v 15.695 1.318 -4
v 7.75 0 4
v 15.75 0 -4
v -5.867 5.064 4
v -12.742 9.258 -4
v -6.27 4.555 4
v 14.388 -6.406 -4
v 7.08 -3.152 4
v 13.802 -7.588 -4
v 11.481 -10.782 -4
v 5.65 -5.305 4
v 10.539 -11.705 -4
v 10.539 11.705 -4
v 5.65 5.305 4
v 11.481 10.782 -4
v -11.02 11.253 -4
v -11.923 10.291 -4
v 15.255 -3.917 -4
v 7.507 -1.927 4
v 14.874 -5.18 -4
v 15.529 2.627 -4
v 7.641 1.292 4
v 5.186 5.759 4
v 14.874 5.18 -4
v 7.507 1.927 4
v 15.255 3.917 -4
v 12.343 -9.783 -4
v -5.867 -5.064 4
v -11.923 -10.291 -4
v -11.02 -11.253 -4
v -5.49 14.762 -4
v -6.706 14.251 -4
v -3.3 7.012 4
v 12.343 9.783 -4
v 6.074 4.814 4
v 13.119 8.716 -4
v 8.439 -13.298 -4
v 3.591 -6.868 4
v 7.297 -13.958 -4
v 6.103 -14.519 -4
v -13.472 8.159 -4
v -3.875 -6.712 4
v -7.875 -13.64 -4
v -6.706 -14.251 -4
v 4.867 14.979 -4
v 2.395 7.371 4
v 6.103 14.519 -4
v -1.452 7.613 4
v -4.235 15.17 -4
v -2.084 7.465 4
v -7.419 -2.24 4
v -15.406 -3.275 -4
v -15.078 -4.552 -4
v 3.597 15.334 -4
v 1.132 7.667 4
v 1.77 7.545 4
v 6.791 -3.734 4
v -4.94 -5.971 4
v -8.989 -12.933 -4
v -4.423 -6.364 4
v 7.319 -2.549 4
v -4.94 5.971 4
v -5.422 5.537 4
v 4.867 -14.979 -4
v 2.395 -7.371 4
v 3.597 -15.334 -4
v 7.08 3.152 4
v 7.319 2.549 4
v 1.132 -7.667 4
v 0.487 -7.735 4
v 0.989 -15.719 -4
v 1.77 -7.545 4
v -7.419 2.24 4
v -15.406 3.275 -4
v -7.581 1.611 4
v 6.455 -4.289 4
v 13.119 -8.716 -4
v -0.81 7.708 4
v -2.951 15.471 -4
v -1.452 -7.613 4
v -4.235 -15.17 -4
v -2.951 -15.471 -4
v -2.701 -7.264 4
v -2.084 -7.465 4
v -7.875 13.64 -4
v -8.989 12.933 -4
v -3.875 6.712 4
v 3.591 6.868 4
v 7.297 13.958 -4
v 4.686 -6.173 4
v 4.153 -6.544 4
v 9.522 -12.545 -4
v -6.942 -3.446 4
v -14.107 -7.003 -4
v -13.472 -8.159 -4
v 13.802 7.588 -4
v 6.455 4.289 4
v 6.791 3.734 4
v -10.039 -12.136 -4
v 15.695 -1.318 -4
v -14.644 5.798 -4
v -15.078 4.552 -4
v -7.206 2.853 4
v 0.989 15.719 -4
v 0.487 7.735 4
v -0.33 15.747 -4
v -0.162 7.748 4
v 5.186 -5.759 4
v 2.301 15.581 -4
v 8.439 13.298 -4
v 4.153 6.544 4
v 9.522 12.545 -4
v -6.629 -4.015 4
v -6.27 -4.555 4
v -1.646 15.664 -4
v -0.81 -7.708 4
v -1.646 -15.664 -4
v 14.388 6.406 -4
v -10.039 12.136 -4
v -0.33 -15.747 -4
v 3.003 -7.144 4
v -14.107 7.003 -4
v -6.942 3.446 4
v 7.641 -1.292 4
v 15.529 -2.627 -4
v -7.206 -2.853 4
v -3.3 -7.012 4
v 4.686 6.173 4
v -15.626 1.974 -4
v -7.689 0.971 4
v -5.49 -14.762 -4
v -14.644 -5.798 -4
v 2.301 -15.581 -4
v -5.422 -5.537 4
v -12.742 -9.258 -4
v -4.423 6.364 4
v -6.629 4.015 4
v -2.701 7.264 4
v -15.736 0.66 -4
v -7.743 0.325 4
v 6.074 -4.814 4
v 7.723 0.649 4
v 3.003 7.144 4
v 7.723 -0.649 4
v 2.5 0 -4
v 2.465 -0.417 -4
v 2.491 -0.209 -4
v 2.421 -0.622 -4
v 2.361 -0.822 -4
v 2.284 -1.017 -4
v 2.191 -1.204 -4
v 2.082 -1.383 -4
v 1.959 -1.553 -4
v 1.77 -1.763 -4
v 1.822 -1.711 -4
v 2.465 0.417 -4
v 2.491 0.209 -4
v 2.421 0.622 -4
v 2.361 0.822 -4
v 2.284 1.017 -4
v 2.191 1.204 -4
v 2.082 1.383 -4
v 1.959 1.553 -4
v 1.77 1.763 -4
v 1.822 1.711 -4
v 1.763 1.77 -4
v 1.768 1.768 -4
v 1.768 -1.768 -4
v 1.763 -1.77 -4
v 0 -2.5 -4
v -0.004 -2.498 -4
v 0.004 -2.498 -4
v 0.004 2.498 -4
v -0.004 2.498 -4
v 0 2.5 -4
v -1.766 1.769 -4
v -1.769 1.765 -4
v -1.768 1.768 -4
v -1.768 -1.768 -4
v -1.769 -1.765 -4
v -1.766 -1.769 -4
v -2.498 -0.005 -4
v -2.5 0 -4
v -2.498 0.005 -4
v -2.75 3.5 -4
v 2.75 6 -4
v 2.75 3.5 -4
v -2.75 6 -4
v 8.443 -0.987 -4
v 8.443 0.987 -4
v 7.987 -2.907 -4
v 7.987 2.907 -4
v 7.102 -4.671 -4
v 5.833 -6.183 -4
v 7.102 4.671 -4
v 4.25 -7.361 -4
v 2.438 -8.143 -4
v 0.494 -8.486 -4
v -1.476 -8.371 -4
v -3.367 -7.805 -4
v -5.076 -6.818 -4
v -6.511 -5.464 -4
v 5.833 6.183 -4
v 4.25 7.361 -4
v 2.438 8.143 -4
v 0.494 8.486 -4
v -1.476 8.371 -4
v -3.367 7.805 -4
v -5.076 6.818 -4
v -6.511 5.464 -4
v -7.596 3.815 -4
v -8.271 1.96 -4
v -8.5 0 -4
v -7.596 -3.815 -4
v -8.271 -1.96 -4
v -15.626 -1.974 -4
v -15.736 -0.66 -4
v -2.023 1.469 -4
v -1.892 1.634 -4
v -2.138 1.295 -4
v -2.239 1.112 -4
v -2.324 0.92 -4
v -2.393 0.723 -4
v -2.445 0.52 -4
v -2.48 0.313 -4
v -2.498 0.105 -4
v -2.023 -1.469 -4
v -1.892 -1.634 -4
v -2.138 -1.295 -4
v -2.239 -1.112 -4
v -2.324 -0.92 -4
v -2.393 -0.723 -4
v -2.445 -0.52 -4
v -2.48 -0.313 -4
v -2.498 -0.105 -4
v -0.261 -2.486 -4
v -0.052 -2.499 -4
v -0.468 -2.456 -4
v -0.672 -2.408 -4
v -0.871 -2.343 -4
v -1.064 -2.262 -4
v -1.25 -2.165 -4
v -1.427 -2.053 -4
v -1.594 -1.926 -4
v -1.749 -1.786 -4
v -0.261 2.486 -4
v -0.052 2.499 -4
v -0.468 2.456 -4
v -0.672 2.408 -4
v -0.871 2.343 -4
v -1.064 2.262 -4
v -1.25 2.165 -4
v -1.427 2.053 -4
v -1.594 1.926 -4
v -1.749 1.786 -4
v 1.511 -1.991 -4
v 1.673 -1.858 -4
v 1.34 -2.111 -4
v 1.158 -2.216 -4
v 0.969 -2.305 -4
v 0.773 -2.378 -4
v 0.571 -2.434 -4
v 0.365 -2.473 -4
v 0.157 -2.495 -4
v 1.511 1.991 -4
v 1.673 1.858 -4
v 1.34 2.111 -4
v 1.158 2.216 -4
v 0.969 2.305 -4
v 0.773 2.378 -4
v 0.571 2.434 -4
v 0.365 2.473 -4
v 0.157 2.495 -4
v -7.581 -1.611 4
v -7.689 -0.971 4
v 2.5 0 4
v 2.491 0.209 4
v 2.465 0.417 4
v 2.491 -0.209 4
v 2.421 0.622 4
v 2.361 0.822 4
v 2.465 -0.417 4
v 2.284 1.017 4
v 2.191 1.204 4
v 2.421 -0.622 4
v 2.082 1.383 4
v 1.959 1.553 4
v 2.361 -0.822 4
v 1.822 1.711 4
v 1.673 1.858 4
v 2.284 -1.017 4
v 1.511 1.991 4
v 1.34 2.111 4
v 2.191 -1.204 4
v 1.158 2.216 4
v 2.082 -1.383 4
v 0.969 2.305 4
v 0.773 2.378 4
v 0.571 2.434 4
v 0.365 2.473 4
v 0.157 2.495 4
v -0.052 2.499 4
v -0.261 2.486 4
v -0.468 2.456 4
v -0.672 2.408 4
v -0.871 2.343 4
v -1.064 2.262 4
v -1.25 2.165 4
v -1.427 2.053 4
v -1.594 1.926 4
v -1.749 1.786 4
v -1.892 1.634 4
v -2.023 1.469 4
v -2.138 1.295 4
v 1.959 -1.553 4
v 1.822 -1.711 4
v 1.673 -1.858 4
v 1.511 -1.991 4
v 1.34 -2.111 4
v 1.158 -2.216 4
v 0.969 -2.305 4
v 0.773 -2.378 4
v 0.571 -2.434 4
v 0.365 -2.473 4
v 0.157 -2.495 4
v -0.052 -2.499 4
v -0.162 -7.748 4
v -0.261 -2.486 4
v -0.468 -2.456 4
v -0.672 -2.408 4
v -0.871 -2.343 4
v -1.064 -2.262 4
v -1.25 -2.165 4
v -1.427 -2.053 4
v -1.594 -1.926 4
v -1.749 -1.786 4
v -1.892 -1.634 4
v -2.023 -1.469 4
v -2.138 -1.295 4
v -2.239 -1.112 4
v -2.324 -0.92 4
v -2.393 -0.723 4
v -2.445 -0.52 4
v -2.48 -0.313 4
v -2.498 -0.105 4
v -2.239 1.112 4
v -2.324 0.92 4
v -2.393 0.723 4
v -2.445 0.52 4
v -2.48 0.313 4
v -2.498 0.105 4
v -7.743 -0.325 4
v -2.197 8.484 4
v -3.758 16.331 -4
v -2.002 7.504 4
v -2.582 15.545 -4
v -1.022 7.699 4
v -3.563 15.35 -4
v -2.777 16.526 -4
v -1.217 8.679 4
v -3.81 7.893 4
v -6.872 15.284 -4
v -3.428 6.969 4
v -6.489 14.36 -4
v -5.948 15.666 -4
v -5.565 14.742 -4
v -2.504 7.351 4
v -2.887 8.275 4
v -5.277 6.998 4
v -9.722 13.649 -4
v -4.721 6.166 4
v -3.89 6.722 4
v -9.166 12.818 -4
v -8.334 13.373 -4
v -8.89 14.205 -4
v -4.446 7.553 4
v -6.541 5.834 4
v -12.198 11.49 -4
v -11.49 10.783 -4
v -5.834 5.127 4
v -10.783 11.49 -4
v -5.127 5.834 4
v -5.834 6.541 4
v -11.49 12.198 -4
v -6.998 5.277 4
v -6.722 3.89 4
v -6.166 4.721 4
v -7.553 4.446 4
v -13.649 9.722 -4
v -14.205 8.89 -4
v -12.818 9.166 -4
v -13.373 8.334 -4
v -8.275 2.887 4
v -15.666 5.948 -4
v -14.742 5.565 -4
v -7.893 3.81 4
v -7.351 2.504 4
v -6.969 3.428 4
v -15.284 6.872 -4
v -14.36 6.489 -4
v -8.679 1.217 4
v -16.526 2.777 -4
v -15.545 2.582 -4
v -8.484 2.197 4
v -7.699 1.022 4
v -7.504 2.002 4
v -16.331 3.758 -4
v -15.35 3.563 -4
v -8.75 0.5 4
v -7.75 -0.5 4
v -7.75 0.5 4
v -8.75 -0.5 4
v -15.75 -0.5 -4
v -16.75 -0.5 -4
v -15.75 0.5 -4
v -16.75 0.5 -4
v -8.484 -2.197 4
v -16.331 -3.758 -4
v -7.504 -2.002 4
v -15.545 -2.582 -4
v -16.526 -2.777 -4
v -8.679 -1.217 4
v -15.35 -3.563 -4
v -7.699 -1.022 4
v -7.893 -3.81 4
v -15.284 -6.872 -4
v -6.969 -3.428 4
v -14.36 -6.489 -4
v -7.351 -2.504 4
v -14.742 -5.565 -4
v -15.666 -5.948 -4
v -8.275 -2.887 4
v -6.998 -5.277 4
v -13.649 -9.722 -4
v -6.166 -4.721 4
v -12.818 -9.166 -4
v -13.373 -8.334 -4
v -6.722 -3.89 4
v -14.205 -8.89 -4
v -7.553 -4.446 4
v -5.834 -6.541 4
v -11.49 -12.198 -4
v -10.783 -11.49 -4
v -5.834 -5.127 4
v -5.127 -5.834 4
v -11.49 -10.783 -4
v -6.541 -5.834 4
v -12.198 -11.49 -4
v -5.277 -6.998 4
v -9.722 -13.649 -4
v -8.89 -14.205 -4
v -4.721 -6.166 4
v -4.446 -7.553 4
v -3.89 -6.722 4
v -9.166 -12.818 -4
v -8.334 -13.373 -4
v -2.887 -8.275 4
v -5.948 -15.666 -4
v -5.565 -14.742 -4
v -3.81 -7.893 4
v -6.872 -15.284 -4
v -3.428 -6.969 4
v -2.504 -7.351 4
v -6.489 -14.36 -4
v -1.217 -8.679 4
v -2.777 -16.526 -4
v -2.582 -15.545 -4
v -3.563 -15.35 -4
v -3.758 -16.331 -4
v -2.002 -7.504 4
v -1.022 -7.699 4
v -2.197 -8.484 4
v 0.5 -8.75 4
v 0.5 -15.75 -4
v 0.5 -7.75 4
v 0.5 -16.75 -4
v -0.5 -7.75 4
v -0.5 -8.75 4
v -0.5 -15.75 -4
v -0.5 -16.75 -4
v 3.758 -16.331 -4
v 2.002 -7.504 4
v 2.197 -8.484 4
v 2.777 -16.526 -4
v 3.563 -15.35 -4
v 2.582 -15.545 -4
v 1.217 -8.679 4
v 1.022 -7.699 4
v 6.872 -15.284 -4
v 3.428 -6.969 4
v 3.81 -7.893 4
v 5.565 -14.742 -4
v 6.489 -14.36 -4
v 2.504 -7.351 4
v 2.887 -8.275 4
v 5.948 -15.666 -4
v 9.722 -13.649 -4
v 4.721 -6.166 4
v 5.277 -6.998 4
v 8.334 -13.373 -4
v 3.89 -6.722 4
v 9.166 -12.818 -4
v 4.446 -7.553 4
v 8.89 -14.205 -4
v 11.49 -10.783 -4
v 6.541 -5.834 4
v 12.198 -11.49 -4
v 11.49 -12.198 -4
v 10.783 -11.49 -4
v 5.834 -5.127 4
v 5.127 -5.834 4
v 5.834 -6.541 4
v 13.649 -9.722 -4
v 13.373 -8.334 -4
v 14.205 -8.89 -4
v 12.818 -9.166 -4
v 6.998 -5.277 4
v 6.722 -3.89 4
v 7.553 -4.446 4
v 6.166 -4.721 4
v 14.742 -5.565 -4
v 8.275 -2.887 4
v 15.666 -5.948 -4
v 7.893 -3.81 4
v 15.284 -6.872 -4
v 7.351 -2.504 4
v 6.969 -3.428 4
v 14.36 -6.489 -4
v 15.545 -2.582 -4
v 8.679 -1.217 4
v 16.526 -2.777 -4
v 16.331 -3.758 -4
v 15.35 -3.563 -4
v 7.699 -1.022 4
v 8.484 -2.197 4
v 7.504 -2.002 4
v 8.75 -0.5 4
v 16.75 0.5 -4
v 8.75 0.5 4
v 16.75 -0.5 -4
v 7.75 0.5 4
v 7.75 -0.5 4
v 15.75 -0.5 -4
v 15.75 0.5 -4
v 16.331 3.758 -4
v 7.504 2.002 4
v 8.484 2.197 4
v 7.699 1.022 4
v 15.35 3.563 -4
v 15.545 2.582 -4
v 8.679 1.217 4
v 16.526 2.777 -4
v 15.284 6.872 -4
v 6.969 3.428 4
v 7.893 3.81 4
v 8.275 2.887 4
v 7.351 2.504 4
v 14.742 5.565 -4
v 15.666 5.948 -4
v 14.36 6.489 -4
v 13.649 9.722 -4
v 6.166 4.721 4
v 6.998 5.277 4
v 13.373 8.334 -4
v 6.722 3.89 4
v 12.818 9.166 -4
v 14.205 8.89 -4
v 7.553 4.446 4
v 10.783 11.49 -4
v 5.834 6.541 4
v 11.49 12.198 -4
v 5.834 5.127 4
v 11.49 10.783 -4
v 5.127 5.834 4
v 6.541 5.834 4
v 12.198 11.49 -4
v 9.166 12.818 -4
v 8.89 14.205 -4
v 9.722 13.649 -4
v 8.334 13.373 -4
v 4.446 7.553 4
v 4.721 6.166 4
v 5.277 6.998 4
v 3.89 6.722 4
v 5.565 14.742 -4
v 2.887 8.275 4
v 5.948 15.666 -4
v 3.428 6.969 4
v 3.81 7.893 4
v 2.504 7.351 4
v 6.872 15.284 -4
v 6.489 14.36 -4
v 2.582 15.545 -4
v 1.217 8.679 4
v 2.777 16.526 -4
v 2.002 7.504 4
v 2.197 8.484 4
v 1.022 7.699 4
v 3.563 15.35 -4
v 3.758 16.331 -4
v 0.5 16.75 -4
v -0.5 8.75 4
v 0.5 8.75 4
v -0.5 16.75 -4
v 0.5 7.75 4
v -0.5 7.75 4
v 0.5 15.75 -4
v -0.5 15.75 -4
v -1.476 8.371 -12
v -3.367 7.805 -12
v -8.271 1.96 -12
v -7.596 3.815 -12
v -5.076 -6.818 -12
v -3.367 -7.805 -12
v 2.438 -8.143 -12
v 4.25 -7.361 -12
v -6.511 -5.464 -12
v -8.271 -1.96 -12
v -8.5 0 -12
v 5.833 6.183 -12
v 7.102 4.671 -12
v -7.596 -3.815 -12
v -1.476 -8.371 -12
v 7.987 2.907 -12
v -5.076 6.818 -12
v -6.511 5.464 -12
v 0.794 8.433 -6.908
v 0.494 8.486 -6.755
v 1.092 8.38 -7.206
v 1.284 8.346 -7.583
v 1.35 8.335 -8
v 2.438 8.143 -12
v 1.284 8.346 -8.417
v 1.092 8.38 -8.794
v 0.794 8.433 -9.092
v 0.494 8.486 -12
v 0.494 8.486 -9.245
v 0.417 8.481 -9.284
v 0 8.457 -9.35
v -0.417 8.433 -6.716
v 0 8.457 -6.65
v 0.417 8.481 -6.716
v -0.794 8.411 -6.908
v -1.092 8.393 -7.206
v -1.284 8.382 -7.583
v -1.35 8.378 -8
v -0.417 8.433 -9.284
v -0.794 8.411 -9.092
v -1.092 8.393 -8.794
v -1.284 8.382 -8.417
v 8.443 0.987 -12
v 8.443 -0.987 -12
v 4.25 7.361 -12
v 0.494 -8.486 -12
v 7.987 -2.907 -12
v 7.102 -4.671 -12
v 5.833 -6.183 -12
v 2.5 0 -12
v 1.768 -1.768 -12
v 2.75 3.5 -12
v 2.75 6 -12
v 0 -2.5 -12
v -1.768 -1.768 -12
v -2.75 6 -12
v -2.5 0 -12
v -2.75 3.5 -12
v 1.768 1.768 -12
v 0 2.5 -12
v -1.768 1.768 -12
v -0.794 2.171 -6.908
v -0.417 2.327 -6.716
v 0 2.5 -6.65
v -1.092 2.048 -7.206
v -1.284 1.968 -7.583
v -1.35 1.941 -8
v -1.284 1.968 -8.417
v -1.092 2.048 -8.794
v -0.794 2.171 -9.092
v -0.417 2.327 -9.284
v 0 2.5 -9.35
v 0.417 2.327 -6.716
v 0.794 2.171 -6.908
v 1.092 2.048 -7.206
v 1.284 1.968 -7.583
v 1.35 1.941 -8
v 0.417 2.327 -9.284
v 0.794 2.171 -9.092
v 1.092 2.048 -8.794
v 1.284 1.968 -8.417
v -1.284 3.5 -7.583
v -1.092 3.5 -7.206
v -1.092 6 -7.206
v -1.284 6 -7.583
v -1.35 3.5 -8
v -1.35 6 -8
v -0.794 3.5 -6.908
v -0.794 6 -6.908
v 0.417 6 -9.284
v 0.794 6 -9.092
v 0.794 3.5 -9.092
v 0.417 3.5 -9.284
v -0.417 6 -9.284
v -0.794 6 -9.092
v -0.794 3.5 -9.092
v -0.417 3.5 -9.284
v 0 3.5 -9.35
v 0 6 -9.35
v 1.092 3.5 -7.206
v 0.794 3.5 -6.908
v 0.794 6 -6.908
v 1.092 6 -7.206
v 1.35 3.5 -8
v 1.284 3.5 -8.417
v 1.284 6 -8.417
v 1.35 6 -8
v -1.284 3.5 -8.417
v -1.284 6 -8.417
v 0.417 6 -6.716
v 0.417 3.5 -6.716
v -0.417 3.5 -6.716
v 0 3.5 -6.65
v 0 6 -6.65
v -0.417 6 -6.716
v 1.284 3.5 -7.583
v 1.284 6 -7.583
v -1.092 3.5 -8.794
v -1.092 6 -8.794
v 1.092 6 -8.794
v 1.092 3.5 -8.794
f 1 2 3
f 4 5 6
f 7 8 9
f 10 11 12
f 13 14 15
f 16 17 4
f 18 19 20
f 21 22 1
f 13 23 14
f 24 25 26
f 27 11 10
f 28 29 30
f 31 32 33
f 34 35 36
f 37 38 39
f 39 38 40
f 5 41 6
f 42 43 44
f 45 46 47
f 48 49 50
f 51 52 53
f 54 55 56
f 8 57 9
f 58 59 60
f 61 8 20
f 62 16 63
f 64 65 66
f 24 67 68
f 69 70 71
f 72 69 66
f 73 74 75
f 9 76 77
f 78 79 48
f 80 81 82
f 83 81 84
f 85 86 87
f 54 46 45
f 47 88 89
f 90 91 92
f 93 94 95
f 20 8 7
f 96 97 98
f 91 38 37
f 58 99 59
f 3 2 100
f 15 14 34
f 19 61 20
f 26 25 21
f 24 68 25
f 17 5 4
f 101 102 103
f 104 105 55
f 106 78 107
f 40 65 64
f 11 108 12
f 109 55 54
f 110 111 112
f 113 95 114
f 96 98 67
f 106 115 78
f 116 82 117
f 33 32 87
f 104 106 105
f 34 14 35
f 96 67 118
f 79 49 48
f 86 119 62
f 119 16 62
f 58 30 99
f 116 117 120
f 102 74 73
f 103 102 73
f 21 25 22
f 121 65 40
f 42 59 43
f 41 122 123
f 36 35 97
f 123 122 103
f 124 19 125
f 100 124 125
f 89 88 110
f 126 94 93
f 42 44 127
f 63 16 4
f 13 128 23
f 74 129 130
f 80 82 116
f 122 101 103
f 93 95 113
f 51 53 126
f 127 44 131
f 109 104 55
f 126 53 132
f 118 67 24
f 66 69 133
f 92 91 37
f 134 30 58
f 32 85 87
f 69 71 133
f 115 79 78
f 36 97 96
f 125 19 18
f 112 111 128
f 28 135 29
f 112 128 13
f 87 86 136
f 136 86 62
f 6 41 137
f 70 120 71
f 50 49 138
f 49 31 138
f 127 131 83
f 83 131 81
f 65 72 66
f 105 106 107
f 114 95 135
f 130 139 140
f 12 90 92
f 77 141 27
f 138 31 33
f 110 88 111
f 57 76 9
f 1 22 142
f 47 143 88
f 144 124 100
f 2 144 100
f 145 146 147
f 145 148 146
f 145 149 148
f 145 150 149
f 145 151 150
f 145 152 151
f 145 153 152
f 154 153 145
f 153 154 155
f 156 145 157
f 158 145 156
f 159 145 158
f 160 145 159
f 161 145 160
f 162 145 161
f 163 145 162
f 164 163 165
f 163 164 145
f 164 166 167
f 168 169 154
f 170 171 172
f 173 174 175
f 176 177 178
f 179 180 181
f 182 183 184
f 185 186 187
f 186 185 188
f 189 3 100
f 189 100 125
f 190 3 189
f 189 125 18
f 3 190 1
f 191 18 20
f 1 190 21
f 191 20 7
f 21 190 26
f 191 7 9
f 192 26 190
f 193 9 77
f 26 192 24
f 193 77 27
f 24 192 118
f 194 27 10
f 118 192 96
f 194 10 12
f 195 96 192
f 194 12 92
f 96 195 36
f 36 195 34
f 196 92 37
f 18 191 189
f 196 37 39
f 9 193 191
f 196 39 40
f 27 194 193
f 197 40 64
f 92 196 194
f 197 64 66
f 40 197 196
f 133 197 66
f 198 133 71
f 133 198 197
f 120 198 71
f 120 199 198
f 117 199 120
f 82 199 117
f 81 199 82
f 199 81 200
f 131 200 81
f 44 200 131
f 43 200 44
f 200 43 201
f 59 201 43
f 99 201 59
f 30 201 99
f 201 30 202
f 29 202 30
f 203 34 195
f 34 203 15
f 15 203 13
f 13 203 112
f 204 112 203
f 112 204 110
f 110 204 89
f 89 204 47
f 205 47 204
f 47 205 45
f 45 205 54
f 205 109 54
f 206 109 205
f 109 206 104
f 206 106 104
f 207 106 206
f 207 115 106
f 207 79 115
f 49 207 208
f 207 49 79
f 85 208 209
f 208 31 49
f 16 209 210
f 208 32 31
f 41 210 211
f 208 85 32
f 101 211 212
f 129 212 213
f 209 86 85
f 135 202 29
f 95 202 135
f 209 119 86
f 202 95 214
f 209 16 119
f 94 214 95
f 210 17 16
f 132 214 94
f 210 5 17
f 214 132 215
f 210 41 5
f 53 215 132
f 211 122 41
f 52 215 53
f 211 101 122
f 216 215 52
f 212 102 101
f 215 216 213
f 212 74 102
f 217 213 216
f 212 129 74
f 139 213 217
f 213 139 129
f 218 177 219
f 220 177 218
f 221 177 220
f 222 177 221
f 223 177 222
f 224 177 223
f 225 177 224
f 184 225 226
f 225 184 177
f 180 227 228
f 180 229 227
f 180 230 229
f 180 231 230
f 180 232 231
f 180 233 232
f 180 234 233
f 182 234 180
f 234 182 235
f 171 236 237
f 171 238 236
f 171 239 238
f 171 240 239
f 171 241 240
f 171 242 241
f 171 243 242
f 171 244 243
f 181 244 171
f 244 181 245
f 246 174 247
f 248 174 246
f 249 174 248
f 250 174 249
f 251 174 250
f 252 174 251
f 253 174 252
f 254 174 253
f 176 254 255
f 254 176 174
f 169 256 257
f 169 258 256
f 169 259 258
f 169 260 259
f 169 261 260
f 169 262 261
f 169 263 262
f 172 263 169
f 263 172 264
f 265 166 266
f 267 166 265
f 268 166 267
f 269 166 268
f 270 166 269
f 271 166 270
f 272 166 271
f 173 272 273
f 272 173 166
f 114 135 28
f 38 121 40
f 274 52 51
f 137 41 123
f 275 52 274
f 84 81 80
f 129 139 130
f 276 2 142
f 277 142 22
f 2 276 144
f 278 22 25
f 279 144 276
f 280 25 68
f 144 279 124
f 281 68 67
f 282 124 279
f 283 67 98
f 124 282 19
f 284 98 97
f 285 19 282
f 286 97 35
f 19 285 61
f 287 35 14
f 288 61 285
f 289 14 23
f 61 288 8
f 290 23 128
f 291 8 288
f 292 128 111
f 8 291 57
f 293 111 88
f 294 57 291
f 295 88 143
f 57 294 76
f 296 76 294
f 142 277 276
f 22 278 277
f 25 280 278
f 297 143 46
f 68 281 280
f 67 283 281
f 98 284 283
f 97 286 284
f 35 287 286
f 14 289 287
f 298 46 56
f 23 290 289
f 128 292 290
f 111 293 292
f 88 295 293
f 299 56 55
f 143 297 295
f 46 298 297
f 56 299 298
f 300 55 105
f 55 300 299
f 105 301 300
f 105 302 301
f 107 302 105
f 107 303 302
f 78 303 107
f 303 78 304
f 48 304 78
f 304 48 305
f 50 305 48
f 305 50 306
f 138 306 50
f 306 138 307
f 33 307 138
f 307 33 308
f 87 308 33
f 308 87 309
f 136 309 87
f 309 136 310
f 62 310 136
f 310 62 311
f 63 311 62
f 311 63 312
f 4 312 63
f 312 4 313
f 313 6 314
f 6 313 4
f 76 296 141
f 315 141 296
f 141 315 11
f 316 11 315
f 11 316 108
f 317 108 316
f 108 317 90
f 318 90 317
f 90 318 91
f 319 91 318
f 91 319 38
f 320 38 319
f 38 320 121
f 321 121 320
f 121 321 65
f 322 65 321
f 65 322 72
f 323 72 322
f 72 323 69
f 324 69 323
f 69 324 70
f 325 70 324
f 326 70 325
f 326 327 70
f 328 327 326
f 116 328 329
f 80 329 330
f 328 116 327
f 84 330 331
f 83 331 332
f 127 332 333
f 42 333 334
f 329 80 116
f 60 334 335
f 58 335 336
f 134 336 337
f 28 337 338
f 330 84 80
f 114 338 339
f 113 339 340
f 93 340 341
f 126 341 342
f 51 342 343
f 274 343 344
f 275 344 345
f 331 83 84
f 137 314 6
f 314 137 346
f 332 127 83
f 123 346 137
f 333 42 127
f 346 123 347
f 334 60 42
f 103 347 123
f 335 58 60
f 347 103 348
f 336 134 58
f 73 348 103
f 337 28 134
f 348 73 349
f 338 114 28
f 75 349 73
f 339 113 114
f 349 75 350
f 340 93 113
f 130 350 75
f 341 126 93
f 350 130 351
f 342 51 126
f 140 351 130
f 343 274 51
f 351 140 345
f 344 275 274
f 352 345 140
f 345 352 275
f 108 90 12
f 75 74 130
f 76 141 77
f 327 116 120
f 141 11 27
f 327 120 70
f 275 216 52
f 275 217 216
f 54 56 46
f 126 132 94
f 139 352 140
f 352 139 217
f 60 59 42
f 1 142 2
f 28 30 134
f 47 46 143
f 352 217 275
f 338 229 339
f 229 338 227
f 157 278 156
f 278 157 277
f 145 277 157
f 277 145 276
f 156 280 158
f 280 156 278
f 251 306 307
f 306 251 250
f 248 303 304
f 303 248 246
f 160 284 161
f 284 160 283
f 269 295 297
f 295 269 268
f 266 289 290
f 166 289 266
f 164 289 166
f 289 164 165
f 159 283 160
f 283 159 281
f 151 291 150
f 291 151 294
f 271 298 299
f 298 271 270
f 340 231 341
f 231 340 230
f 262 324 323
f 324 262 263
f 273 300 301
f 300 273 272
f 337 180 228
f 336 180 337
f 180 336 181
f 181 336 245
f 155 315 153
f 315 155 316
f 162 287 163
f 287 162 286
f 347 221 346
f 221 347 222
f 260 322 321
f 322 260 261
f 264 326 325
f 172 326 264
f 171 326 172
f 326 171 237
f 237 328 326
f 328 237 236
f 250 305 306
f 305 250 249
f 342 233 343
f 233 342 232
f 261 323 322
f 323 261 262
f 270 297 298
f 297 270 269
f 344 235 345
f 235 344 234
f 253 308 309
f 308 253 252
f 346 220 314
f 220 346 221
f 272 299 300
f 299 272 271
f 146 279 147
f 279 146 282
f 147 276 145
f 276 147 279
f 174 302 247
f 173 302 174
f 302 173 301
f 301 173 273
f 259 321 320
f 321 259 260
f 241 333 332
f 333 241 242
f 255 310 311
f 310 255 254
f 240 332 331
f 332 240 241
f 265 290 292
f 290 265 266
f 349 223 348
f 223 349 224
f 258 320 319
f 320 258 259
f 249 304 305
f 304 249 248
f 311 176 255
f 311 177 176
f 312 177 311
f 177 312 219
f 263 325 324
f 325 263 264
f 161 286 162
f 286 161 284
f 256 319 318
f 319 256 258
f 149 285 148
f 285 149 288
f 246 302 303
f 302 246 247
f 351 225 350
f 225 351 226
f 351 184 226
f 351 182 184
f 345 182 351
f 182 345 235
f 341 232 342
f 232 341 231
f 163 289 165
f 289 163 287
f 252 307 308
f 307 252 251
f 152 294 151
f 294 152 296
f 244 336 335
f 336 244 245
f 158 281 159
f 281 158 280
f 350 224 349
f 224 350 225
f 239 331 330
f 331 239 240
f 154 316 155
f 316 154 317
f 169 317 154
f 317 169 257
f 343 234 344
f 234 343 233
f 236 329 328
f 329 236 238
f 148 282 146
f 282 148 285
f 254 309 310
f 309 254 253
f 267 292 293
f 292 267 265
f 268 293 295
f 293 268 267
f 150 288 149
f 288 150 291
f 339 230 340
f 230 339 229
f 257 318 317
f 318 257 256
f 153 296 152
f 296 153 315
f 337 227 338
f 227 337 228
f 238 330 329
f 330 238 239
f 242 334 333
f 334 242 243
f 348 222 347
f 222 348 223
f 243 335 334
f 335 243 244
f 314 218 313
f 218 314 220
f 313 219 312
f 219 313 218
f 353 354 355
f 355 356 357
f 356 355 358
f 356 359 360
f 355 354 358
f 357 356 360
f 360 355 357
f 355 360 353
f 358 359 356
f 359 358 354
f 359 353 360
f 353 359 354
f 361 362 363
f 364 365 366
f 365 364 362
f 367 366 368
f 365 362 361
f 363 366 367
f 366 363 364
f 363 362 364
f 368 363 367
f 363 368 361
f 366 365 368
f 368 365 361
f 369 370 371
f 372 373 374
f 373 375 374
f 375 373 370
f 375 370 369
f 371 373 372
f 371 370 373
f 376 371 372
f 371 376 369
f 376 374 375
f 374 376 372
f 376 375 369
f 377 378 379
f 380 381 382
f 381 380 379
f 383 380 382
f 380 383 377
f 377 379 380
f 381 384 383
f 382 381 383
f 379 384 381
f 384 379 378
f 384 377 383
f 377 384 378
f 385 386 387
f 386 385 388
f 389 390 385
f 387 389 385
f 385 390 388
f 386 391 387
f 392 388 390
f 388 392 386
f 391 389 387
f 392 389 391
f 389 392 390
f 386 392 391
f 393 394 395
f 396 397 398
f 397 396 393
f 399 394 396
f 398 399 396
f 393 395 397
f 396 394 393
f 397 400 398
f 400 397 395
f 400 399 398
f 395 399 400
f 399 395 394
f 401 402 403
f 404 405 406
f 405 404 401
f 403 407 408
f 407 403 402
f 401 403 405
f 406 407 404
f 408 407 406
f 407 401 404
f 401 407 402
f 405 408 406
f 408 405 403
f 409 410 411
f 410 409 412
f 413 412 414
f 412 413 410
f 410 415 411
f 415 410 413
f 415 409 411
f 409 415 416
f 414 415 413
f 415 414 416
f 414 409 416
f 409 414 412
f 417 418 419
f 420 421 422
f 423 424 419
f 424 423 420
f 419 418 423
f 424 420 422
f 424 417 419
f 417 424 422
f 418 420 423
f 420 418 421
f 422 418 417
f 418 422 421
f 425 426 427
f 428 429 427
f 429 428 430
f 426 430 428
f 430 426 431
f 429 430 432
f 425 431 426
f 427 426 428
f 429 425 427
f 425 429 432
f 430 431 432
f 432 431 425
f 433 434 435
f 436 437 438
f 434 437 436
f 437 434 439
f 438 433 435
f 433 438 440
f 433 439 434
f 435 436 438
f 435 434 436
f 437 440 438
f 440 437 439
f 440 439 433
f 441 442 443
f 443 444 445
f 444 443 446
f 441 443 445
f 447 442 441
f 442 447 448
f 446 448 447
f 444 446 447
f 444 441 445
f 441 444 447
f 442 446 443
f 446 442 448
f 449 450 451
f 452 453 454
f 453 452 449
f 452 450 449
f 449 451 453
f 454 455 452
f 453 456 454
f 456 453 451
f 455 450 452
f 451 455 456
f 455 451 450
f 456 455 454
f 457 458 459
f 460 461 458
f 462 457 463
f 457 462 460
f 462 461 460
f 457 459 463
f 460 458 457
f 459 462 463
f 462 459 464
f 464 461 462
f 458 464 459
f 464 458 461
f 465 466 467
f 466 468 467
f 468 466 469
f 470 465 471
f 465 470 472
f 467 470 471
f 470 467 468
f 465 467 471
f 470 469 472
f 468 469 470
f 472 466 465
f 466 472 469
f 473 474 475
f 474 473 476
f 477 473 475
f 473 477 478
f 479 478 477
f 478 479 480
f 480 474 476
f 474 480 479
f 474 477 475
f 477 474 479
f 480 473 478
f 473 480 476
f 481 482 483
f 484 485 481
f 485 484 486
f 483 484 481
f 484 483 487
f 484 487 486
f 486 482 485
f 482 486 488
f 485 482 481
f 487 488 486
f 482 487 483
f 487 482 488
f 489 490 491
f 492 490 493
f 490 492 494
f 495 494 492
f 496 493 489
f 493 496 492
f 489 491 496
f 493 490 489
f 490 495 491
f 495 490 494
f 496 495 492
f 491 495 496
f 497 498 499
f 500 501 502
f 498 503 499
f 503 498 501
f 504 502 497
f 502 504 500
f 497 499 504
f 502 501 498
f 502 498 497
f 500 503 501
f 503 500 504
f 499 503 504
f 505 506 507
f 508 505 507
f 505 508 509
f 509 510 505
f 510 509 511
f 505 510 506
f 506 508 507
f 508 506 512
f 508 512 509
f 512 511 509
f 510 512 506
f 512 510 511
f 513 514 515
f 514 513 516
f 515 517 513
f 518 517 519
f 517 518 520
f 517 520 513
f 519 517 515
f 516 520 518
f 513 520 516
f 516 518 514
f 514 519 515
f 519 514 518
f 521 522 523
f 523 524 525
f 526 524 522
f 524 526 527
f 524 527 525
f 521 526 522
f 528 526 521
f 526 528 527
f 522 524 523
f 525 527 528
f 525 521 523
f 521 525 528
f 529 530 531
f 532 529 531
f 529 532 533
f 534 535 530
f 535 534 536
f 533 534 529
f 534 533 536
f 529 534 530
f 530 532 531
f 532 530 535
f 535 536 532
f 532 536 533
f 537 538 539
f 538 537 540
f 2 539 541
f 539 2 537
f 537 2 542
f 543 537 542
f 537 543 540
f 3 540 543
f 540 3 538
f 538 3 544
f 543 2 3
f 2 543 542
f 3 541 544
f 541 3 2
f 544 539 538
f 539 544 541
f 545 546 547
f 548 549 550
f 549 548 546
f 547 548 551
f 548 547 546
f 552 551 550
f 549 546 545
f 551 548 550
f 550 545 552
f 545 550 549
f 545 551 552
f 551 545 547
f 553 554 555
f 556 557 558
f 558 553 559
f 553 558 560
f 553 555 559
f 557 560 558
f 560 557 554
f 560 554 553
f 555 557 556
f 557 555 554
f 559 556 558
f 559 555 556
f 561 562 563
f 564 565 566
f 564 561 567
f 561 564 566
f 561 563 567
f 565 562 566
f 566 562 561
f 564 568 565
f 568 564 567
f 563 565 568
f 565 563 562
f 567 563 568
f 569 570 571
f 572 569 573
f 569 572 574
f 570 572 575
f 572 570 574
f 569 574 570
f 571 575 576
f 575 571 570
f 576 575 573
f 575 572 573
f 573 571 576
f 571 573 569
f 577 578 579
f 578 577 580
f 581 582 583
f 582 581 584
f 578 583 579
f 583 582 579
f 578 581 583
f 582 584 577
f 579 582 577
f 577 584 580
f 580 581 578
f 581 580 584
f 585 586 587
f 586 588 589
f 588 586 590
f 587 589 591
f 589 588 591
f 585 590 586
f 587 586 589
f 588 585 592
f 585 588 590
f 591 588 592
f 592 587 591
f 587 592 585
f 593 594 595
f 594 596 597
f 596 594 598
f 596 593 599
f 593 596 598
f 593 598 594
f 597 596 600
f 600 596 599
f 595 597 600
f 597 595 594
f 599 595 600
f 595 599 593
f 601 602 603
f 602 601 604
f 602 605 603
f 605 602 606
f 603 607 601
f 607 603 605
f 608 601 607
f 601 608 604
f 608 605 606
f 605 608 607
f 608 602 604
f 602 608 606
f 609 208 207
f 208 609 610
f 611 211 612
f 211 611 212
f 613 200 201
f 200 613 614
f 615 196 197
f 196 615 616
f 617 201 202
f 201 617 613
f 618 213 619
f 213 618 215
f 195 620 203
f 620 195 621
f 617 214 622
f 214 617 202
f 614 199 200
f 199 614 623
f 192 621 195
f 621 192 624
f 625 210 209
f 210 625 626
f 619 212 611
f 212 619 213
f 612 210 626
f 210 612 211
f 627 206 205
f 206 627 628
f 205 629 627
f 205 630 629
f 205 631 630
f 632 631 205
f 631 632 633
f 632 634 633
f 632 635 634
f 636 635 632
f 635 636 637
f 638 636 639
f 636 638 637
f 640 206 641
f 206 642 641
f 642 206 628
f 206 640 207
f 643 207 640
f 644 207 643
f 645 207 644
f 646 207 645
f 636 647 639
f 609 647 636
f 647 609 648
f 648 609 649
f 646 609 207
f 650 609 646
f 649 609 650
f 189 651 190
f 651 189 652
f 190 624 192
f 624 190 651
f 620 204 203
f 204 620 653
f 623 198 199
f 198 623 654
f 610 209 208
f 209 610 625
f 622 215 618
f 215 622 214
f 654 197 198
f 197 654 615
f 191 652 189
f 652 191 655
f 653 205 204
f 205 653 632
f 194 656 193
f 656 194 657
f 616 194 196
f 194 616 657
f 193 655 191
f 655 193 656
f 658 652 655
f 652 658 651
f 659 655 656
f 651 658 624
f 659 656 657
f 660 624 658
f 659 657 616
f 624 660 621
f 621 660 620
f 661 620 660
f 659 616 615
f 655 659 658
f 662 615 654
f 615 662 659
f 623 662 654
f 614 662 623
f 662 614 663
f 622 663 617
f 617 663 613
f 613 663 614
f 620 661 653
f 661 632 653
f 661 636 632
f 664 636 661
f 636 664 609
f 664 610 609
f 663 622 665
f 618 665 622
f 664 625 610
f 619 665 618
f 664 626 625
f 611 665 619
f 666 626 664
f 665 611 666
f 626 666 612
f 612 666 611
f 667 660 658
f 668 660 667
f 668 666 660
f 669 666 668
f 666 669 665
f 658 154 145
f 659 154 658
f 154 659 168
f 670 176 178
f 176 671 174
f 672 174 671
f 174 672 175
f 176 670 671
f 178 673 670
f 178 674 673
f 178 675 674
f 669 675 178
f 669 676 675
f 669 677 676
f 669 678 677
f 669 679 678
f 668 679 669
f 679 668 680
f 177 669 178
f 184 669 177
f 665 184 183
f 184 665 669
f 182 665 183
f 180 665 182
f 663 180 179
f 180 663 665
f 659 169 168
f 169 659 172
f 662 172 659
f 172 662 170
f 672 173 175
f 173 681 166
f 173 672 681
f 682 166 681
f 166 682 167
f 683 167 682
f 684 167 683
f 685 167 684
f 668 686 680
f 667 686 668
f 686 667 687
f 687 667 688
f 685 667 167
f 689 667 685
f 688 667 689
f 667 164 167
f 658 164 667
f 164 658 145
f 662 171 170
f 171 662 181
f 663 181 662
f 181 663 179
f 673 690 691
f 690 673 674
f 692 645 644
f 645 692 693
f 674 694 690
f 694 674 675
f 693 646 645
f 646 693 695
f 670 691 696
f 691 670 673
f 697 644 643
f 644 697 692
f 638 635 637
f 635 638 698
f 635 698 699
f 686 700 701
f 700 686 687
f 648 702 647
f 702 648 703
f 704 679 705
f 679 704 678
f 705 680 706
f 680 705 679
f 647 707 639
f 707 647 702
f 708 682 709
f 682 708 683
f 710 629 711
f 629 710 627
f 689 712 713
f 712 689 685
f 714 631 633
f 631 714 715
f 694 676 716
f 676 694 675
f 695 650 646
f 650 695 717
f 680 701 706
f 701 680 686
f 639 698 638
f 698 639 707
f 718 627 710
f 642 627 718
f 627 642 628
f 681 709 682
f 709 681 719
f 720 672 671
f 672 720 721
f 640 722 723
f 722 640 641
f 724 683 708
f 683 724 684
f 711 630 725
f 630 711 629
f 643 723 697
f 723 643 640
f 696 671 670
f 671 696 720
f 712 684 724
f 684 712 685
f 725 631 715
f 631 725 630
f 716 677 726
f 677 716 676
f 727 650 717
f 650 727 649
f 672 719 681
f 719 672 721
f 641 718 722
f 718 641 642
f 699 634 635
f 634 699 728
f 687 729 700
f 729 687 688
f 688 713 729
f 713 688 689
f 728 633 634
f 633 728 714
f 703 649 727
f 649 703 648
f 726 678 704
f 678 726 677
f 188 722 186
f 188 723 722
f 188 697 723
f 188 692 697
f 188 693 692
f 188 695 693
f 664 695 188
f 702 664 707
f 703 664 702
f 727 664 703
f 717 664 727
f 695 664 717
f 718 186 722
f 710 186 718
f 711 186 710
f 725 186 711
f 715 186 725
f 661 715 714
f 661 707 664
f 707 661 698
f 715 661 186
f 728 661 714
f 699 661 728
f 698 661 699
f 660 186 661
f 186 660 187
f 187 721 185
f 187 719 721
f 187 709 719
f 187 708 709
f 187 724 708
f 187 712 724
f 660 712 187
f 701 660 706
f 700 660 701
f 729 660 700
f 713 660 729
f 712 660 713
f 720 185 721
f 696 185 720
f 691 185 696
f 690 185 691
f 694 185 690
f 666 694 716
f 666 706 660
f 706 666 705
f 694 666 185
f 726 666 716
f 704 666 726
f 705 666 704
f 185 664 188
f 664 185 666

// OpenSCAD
// Parametric Gears
// by wayland
// http://www.thingiverse.com/thing:2085

// General Parameters

basediameter = 32;   // pitch diameter of widest part 
depth = 8;           // depth of the gear
holediam = 5;        // diameter of center hole
teethnumber = 32;    // number of teeth
toothwidth = 1;      // width of teeth
addendum = 1/2;      // addendum
dedendum = 1/2;      // dedendum
toothshape = 0;   // how much of the tooth is triangular			                // for no triangles, make it 0
				 // otherwise it should be a fraction
centercircles = 0;   // number of center circles
				 // if you don't want any, put 0
				 // they are radially centered
centercircdiam = 3;  // diameter of center circles


//Bevel Parameters

degrees = 45;        // base angle of the gear
				 // 90 for a regular spur gear
				 // negative numbers are possible
extendbevel = 0;     // creates a spur top for bevel gears 
				 // only works if rbasediameter = 0
				 // 1 is on, 0 is off
bdepth = 3;          // thickness of extended bevel 
basedepth = 2;       // depth of the flat base at the bottom
				 // to turn it off, just make it 0

//Rome Gear Parameters:

rbasediameter = 0;   // pitch diameter of widest part
				 // to turn Rome gear off, make it 0
rdegrees = 90;       // base angle
rdepth = 2;          // thickness
rteeth = 10;         // number of teeth
rtwidth = 1;         // tooth width
raddendum = 1/4;     // addendum
rdedendum = 1/4;     // dedendum
rtoothshape = 1;

//Mounting:

mountingwall = 2;
nuthole = 5.5;
nutholedepth = 2.5;

/*---------------------------------------------------------*/

// Modules

module gear (diam1, thick, angle, ded, add, twidth, tnumber, toothfraction)
 {

	//Trig to find top diameter:

	triangbase = thick / tan(angle);
	topdiameter =  (diam1 - 2 * triangbase) - ded;

	//Miscellaneous variables:

	bottomdiameter = diam1 - ded;
	howmuchistri = toothfraction * (add + ded);
	toothlength = (add + ded) - howmuchistri; 
	xthick = twidth/2;

	union() {

		difference () {

			cylinder(h = thick, r1 = bottomdiameter/2, r2 = topdiameter/2, $fn = 75, center = true);
			cylinder(h = 2*thick, r = holediam / 2, center = true, $fn = 75);
			centershape(thick, topdiameter);

			}

		}

		for ( i = [1:tnumber] ) {

			rotate( i*360/tnumber, [0, 0, 1])
			translate ([0, 0, thick / -2])

			geartooth (bottomdiameter, topdiameter, xthick, toothlength, thick, howmuchistri);

		}

}

module centershape (thick, diam) {

if (centercircles > 0) {

	for ( f = [1:centercircles] ) {

		rotate( f*360/centercircles, [0, 0, 1])
		translate ([diam/4, 0, 0 ])
		cylinder ( h = 2*thick, r = centercircdiam/2, $fn = 75, center = true);

	}

}

}

module geartooth (diam1, diam2, xthickness, tlength, zthick, point){

// Sorry... polyhedra are so messy in openSCAD
// In case you're wondering, the following polyhedra are one
// tooth. The first is rectangular, the second has triangles.

	if (point == 0) {

	polyhedron ( points = 
[[-xthickness, diam2/2, zthick], [-xthickness, tlength + diam2/2, zthick], [-xthickness, tlength + diam1/2, 0], [-xthickness, diam1/2, 0], [xthickness, diam2/2, zthick], [xthickness, tlength + diam2/2, zthick], [xthickness, tlength + diam1/2, 0], [xthickness, diam1/2, 0]
], triangles = [[0,2,1], [0,3,2],[3,0,4],[1,2,5],[0,5,4],[0,1,5],[5,2,6],[7,3,4],[4,5,6],[4,6,7],[6,2,7],[2,3,7]]);

	}

	if (point > 0 ) {

		polyhedron ( points = 
[[-xthickness, diam2/2, zthick], [-xthickness, tlength + diam2/2, zthick], [-xthickness, tlength + diam1/2, 0], [-xthickness, diam1/2, 0], [xthickness, diam2/2, zthick], [xthickness, tlength + diam2/2, zthick], [xthickness, tlength + diam1/2, 0], [xthickness, diam1/2, 0],[0, tlength + diam2/2 + point, zthick],[0, tlength + diam1/2 + point, 0]
], triangles = [[0,2,1], [0,3,2],[3,0,4],[1,2,8],[0,5,4],[0,1,5],[5,9,6],[7,3,4],[4,5,6],[4,6,7],[6,2,7],[2,3,7],[1,8,5],[2,6,9],[2,9,8],[5,8,9],]);

	}

}
/*---------------------------------------------------------*/
module bevel_gear () {
	gear (basediameter, depth, degrees, dedendum, addendum, toothwidth, teethnumber, toothshape);
	if (rbasediameter > 0) {
		translate ([0, 0, depth/2 + rdepth/2])
		gear (rbasediameter, rdepth, rdegrees, rdedendum, raddendum, rtwidth, rteeth, rtoothshape);
	}

//More trig to find top diameter:

	triangbase = depth / tan(degrees);
	topdiameter =  (basediameter - 2 * triangbase);

	if (rbasediameter == 0 && extendbevel == 1) {
		translate ([0, 0, depth/2 + bdepth/2])
		gear (topdiameter, bdepth, 90, dedendum, addendum, toothwidth, teethnumber);
	}

	translate([0, 0, -(depth / 2)])
		rotate([0, 180, 0])
			difference() {
				cylinder(d = holediam + (mountingwall * 6), h = depth);
				translate([0, 0, -1]) {
					cylinder(d = holediam, h = depth + 2, $f = 20);
				}
				rotate([-90, 0, 0]) {
					translate([0, -(depth / 2), 0])
						cylinder(d = 2.7, h = 100, $fn = 20);
				}
				rotate([0, 90, 90]) {
					translate([-9, -(nuthole / 2), holediam - (nutholedepth - 1)])
						cube([depth + 1, nuthole, nutholedepth]);
				}
			}
}

bevel_gear();
